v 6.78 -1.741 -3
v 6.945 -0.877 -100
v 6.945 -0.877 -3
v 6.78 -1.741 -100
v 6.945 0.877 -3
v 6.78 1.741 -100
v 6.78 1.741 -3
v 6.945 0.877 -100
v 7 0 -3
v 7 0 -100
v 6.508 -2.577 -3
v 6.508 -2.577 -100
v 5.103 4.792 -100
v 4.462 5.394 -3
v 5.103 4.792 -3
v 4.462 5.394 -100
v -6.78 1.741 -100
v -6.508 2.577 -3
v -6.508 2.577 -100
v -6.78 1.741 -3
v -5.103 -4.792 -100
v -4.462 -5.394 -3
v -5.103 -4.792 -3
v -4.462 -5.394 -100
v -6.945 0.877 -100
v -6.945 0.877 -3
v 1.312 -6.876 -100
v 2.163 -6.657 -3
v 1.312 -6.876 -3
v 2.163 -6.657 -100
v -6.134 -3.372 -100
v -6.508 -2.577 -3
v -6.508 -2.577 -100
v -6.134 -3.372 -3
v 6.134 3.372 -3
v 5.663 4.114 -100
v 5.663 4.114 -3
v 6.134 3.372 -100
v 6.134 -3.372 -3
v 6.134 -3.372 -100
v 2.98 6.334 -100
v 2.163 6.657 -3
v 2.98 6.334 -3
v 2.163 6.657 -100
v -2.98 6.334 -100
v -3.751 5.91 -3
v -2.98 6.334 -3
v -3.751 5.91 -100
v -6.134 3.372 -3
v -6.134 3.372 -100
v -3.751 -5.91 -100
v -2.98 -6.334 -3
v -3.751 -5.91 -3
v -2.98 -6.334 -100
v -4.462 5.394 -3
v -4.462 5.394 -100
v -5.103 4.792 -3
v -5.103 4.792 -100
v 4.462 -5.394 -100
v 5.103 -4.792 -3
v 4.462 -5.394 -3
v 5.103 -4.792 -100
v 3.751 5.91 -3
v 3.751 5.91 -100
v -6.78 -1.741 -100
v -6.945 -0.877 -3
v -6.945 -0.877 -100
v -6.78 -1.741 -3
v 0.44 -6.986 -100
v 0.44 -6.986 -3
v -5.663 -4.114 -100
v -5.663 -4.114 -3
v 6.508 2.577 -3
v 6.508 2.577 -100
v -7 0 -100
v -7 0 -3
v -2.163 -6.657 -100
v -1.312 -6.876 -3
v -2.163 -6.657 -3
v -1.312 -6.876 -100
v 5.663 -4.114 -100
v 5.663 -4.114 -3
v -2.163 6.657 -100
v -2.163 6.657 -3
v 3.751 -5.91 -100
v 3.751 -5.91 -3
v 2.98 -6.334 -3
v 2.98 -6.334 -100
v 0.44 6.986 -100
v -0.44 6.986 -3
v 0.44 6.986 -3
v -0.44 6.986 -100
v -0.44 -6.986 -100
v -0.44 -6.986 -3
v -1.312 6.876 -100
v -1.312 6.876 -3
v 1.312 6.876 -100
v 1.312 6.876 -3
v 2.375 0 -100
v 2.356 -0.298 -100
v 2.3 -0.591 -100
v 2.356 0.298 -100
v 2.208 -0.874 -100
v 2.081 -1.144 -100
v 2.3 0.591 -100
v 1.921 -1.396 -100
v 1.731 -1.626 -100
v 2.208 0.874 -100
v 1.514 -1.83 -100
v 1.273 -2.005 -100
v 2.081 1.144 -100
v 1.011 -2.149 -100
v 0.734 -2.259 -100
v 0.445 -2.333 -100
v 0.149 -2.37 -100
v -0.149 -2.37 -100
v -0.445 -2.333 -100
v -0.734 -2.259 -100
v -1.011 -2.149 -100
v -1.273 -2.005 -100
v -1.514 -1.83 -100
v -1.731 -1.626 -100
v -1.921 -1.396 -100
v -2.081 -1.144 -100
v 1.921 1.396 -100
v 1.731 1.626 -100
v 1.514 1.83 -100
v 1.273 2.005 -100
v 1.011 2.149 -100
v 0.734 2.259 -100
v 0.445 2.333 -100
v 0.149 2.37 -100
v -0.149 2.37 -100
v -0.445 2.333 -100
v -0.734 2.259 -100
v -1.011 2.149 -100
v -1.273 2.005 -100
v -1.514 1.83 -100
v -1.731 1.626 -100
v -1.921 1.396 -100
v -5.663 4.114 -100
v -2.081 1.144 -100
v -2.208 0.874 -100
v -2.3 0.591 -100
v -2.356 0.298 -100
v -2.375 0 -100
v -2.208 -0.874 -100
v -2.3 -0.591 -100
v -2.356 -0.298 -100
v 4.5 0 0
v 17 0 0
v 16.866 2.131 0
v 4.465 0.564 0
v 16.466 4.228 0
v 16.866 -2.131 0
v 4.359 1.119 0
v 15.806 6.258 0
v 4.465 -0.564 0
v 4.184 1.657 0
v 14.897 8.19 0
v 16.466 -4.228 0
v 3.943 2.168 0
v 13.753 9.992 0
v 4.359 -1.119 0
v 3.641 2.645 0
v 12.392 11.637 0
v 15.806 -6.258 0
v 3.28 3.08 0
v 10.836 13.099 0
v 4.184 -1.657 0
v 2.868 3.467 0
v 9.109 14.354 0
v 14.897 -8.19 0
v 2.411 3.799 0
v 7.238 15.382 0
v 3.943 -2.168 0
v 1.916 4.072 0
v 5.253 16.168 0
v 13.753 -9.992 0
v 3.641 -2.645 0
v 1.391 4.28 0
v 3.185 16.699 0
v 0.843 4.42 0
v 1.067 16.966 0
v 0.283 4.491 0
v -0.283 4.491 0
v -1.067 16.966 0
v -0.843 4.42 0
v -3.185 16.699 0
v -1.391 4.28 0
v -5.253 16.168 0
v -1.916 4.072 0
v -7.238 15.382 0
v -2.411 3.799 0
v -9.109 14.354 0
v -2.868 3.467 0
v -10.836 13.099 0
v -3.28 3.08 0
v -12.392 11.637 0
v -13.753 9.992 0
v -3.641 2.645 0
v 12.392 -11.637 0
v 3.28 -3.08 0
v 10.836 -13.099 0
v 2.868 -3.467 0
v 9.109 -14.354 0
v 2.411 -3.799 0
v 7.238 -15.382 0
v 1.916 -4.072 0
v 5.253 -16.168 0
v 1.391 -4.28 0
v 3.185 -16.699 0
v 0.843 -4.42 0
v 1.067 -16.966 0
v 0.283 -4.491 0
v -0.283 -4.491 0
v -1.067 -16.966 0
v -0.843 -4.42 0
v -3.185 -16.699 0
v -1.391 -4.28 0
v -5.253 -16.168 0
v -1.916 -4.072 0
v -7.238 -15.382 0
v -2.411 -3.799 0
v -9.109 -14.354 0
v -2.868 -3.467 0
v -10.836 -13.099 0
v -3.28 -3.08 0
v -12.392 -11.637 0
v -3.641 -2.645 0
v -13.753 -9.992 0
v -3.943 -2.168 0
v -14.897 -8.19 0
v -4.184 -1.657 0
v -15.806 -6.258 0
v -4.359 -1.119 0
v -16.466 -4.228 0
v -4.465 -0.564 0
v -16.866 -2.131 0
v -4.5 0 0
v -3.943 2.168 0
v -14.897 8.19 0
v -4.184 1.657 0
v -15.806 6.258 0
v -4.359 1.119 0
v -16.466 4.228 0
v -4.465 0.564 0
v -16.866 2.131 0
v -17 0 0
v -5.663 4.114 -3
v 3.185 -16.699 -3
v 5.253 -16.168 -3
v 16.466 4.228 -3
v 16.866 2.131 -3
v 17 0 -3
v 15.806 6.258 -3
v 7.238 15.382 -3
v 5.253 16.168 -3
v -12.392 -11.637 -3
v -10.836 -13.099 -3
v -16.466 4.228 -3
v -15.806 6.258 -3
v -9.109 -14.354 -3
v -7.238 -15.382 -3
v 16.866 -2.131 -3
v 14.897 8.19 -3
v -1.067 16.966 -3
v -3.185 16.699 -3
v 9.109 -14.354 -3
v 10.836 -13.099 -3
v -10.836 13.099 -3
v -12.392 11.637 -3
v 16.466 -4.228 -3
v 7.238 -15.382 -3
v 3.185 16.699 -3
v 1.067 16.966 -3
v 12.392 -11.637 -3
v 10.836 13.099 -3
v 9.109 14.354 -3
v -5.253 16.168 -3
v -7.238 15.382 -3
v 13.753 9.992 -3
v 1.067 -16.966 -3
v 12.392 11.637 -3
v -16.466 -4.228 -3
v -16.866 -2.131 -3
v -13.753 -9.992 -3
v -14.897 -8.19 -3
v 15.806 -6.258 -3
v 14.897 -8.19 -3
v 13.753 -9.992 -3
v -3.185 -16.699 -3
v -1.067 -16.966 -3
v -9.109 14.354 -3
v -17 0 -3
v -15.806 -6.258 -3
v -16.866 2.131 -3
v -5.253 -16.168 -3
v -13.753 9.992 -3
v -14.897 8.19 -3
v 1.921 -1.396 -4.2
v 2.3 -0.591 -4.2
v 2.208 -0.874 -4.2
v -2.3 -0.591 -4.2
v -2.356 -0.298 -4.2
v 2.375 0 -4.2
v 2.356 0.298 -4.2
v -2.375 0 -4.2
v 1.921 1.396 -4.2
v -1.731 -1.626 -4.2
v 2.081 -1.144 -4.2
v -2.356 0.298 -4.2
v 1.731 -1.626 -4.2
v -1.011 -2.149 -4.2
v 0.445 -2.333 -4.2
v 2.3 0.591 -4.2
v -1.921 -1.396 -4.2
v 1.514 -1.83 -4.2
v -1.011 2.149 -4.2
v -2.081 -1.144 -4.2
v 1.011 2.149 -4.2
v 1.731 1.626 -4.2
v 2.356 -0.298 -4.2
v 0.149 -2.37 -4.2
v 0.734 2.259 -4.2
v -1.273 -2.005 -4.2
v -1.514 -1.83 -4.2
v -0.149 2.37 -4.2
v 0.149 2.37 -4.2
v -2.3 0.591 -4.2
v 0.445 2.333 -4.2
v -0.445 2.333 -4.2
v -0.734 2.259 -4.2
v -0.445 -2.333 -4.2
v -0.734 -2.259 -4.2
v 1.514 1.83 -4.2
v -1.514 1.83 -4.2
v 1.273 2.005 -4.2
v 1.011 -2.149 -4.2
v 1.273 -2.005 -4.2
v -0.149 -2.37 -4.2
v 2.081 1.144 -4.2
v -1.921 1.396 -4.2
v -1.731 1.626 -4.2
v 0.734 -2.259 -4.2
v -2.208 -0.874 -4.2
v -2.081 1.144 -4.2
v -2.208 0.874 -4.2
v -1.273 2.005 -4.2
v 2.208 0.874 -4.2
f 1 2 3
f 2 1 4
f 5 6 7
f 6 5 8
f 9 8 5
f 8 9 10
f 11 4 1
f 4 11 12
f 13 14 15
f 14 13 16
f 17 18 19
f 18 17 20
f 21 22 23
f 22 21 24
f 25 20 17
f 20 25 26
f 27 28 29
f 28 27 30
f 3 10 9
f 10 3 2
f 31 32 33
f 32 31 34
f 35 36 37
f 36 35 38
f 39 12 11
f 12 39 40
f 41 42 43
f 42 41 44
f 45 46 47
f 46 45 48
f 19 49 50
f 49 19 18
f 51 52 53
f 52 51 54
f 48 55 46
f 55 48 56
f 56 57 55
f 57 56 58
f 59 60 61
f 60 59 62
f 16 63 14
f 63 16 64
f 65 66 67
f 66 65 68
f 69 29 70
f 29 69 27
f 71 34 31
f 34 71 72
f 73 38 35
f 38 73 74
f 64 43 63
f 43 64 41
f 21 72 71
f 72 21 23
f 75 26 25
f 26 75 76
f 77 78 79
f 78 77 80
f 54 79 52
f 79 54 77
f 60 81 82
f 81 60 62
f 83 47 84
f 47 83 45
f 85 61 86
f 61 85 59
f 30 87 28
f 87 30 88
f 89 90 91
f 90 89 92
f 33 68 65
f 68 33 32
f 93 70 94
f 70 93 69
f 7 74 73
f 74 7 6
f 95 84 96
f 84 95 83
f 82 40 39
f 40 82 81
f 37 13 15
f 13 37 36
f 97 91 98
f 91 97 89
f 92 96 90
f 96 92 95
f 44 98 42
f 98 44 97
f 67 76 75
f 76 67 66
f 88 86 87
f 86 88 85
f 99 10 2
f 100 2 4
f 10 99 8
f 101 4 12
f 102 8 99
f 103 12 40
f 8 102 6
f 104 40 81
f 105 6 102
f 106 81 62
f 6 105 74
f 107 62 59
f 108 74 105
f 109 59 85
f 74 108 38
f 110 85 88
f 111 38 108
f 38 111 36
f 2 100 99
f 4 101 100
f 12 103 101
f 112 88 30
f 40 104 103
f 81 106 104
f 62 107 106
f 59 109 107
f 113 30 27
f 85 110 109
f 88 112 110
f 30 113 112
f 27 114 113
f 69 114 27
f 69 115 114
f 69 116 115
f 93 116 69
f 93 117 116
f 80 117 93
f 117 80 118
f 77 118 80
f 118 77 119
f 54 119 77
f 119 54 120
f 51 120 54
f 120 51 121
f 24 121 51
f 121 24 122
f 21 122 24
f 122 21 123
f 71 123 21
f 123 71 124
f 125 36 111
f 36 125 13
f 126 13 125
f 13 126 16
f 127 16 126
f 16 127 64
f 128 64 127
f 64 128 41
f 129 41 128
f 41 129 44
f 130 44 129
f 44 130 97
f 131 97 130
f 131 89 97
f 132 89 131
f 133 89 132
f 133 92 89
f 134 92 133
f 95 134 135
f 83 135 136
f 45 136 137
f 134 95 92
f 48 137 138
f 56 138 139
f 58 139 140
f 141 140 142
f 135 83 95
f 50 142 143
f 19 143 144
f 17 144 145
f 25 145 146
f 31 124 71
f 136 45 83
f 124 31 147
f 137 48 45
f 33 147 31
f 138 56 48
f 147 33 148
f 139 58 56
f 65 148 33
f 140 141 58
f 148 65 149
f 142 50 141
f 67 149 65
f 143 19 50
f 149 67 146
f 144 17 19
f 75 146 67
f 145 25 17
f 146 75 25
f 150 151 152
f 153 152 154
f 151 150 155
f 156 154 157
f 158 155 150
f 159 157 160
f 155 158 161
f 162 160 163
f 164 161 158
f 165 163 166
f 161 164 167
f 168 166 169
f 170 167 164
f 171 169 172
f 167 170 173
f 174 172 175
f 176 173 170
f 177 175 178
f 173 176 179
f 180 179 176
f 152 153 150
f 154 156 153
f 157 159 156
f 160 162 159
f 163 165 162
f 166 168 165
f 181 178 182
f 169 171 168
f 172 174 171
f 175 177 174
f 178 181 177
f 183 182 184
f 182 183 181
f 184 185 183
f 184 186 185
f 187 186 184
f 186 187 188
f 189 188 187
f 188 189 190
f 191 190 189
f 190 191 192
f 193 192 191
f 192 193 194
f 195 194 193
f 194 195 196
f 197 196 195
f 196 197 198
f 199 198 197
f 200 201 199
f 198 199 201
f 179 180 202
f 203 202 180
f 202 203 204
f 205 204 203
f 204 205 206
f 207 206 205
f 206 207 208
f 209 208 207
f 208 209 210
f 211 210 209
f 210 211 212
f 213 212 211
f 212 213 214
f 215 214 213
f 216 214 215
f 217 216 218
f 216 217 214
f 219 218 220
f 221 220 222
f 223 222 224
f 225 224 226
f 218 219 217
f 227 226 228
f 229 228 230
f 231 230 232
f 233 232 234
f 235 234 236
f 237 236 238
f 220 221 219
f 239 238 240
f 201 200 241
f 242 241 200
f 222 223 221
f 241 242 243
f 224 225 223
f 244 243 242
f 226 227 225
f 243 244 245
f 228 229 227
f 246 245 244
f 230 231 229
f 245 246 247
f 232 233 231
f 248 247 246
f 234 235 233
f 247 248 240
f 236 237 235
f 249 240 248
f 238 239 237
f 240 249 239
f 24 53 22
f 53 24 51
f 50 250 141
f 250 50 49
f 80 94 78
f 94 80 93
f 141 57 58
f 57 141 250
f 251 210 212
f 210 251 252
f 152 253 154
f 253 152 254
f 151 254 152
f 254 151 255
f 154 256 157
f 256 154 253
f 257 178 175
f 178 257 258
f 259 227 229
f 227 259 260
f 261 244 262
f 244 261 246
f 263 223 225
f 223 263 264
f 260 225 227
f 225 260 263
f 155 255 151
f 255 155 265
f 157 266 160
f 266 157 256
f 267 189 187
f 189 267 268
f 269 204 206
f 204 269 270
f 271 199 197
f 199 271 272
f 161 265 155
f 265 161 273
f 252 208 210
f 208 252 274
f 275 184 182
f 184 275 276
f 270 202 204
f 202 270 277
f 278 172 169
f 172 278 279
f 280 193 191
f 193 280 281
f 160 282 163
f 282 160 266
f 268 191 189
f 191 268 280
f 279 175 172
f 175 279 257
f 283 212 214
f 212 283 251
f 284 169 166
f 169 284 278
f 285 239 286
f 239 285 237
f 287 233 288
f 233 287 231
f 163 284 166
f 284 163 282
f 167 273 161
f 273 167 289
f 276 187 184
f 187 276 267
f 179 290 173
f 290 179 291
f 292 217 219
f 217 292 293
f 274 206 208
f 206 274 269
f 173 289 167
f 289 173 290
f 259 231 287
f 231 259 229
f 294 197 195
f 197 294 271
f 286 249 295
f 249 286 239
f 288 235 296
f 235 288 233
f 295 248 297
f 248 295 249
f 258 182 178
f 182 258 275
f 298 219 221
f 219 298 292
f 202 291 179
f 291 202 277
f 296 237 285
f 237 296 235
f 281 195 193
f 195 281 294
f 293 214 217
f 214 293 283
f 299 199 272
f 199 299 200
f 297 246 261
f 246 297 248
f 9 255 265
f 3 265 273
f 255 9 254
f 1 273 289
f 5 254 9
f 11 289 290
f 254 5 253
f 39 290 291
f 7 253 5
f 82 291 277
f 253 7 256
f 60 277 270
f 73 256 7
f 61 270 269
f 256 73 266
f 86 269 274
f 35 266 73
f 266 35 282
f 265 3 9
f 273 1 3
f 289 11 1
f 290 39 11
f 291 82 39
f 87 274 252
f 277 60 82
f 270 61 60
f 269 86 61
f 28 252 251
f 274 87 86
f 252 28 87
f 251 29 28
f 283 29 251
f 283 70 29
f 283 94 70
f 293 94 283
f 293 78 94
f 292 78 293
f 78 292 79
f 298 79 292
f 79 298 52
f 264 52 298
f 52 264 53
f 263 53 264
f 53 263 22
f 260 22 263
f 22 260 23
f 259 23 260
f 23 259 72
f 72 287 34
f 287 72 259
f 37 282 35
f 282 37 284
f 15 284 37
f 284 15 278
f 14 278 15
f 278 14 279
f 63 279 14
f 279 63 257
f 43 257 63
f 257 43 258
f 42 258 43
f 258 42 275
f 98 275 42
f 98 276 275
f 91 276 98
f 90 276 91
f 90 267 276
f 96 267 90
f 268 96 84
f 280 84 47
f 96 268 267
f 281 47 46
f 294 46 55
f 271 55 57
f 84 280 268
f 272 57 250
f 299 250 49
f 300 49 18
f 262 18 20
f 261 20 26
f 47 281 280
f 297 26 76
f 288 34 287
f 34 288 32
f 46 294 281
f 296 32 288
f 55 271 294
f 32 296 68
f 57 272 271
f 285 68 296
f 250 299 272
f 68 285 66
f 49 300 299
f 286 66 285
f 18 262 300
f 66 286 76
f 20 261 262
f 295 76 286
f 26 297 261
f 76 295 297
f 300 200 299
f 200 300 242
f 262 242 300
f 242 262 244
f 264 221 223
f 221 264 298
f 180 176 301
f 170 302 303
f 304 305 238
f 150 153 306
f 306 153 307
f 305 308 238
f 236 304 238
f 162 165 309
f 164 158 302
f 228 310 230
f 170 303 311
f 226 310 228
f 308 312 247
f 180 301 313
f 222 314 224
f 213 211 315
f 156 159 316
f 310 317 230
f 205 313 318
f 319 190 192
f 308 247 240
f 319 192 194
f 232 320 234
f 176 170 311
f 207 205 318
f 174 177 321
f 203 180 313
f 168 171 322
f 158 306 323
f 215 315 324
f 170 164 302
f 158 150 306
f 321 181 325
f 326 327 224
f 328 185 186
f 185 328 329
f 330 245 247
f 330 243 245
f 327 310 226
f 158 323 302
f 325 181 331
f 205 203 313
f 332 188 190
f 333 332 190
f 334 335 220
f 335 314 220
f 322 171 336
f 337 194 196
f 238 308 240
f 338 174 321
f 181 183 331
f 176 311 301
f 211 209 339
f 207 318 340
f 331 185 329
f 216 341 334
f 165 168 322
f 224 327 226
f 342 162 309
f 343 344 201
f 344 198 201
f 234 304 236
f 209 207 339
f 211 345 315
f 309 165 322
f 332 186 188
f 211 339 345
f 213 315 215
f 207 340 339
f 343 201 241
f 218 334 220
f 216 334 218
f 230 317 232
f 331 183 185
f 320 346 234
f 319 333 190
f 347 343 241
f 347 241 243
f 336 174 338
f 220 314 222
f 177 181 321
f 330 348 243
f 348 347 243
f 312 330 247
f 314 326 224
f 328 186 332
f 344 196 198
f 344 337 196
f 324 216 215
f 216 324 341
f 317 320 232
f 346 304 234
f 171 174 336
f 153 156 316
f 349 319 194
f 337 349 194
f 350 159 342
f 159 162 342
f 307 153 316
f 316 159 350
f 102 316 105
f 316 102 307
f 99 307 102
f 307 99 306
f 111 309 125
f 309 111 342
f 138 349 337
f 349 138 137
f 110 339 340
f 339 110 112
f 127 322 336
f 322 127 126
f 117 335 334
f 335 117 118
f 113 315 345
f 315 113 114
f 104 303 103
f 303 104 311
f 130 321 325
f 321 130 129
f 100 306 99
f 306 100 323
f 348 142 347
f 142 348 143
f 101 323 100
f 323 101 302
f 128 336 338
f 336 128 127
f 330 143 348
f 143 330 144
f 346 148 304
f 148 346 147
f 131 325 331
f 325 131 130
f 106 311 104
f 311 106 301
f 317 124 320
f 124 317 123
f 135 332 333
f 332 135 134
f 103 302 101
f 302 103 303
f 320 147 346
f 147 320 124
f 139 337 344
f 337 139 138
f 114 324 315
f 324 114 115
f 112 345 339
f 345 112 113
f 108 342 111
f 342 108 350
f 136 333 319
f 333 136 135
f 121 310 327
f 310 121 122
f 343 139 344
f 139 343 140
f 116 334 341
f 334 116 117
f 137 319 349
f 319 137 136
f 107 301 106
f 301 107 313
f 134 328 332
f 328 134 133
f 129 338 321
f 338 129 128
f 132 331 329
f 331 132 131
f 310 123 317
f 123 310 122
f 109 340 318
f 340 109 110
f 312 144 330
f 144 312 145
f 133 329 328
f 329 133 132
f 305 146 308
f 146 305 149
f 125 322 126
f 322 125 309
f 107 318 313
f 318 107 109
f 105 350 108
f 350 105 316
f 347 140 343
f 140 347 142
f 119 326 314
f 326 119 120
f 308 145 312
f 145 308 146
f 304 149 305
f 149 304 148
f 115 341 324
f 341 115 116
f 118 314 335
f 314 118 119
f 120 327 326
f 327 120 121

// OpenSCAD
$fn = 50;


difference() {
	union() {
		translate(v = [0, 0, -100.0000000000]) {
			cylinder(h = 100, r = 7.0000000000);
		}
		translate(v = [0, 0, -3.0000000000]) {
			cylinder(h = 3, r = 17.0000000000);
		}
	}
	union() {
		translate(v = [0, 0, 0]) {
			rotate(a = [0, 0, 0]) {
				difference() {
					union() {
						#translate(v = [0, 0, -100.0000000000]) {
							cylinder(h = 100, r = 2.2500000000);
						}
						#translate(v = [0, 0, -4.2000000000]) {
							cylinder(h = 4.2000000000, r = 7.0000000000, r1 = 2.3750000000, r2 = 4.5000000000);
						}
						#translate(v = [0, 0, -100.0000000000]) {
							cylinder(h = 100, r = 2.3750000000);
						}
						#translate(v = [0, 0, -100.0000000000]) {
							cylinder(h = 100, r = 2.2500000000);
						}
					}
					union();
				}
			}
		}
	}
}
